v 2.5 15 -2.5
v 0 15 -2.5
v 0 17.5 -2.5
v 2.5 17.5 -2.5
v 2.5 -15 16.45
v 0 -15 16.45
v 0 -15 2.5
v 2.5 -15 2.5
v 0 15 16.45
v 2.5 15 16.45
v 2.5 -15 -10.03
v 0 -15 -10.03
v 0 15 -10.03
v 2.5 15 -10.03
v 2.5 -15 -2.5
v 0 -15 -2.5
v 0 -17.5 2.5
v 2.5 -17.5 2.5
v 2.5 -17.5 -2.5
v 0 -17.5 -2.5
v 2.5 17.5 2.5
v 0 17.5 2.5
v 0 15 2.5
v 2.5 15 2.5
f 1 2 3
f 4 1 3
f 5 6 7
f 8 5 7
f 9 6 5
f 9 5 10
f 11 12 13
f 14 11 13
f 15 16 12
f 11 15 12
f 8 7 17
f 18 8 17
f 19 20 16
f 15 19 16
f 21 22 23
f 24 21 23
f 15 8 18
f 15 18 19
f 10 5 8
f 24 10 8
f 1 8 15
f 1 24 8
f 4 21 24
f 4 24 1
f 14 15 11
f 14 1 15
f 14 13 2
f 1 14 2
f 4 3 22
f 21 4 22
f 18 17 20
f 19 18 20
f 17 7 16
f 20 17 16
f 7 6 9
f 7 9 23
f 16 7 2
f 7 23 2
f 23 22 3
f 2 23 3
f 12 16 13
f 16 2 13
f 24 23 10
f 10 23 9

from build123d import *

# Parameters (mm, degrees)
BOSS_EXTRUDE4_DEPTH = 2.5


with BuildPart() as part:
    # Sketch1<5> → Boss-Extrude4 (new body)
    with BuildSketch(Plane(origin=(0, 0, 0), x_dir=(0, 0, -1), z_dir=(1, 0, 0))):
        Polygon((-16.45, -15), (-2.5, -15), (-2.5, -17.5), (2.5, -17.5), (2.5, -15), (10.03, -15), (10.03, 15), (2.5, 15), (2.5, 17.5), (-2.5, 17.5), (-2.5, 15), (-16.45, 15), align=None)
    extrude(amount=BOSS_EXTRUDE4_DEPTH)


solid = part.part
